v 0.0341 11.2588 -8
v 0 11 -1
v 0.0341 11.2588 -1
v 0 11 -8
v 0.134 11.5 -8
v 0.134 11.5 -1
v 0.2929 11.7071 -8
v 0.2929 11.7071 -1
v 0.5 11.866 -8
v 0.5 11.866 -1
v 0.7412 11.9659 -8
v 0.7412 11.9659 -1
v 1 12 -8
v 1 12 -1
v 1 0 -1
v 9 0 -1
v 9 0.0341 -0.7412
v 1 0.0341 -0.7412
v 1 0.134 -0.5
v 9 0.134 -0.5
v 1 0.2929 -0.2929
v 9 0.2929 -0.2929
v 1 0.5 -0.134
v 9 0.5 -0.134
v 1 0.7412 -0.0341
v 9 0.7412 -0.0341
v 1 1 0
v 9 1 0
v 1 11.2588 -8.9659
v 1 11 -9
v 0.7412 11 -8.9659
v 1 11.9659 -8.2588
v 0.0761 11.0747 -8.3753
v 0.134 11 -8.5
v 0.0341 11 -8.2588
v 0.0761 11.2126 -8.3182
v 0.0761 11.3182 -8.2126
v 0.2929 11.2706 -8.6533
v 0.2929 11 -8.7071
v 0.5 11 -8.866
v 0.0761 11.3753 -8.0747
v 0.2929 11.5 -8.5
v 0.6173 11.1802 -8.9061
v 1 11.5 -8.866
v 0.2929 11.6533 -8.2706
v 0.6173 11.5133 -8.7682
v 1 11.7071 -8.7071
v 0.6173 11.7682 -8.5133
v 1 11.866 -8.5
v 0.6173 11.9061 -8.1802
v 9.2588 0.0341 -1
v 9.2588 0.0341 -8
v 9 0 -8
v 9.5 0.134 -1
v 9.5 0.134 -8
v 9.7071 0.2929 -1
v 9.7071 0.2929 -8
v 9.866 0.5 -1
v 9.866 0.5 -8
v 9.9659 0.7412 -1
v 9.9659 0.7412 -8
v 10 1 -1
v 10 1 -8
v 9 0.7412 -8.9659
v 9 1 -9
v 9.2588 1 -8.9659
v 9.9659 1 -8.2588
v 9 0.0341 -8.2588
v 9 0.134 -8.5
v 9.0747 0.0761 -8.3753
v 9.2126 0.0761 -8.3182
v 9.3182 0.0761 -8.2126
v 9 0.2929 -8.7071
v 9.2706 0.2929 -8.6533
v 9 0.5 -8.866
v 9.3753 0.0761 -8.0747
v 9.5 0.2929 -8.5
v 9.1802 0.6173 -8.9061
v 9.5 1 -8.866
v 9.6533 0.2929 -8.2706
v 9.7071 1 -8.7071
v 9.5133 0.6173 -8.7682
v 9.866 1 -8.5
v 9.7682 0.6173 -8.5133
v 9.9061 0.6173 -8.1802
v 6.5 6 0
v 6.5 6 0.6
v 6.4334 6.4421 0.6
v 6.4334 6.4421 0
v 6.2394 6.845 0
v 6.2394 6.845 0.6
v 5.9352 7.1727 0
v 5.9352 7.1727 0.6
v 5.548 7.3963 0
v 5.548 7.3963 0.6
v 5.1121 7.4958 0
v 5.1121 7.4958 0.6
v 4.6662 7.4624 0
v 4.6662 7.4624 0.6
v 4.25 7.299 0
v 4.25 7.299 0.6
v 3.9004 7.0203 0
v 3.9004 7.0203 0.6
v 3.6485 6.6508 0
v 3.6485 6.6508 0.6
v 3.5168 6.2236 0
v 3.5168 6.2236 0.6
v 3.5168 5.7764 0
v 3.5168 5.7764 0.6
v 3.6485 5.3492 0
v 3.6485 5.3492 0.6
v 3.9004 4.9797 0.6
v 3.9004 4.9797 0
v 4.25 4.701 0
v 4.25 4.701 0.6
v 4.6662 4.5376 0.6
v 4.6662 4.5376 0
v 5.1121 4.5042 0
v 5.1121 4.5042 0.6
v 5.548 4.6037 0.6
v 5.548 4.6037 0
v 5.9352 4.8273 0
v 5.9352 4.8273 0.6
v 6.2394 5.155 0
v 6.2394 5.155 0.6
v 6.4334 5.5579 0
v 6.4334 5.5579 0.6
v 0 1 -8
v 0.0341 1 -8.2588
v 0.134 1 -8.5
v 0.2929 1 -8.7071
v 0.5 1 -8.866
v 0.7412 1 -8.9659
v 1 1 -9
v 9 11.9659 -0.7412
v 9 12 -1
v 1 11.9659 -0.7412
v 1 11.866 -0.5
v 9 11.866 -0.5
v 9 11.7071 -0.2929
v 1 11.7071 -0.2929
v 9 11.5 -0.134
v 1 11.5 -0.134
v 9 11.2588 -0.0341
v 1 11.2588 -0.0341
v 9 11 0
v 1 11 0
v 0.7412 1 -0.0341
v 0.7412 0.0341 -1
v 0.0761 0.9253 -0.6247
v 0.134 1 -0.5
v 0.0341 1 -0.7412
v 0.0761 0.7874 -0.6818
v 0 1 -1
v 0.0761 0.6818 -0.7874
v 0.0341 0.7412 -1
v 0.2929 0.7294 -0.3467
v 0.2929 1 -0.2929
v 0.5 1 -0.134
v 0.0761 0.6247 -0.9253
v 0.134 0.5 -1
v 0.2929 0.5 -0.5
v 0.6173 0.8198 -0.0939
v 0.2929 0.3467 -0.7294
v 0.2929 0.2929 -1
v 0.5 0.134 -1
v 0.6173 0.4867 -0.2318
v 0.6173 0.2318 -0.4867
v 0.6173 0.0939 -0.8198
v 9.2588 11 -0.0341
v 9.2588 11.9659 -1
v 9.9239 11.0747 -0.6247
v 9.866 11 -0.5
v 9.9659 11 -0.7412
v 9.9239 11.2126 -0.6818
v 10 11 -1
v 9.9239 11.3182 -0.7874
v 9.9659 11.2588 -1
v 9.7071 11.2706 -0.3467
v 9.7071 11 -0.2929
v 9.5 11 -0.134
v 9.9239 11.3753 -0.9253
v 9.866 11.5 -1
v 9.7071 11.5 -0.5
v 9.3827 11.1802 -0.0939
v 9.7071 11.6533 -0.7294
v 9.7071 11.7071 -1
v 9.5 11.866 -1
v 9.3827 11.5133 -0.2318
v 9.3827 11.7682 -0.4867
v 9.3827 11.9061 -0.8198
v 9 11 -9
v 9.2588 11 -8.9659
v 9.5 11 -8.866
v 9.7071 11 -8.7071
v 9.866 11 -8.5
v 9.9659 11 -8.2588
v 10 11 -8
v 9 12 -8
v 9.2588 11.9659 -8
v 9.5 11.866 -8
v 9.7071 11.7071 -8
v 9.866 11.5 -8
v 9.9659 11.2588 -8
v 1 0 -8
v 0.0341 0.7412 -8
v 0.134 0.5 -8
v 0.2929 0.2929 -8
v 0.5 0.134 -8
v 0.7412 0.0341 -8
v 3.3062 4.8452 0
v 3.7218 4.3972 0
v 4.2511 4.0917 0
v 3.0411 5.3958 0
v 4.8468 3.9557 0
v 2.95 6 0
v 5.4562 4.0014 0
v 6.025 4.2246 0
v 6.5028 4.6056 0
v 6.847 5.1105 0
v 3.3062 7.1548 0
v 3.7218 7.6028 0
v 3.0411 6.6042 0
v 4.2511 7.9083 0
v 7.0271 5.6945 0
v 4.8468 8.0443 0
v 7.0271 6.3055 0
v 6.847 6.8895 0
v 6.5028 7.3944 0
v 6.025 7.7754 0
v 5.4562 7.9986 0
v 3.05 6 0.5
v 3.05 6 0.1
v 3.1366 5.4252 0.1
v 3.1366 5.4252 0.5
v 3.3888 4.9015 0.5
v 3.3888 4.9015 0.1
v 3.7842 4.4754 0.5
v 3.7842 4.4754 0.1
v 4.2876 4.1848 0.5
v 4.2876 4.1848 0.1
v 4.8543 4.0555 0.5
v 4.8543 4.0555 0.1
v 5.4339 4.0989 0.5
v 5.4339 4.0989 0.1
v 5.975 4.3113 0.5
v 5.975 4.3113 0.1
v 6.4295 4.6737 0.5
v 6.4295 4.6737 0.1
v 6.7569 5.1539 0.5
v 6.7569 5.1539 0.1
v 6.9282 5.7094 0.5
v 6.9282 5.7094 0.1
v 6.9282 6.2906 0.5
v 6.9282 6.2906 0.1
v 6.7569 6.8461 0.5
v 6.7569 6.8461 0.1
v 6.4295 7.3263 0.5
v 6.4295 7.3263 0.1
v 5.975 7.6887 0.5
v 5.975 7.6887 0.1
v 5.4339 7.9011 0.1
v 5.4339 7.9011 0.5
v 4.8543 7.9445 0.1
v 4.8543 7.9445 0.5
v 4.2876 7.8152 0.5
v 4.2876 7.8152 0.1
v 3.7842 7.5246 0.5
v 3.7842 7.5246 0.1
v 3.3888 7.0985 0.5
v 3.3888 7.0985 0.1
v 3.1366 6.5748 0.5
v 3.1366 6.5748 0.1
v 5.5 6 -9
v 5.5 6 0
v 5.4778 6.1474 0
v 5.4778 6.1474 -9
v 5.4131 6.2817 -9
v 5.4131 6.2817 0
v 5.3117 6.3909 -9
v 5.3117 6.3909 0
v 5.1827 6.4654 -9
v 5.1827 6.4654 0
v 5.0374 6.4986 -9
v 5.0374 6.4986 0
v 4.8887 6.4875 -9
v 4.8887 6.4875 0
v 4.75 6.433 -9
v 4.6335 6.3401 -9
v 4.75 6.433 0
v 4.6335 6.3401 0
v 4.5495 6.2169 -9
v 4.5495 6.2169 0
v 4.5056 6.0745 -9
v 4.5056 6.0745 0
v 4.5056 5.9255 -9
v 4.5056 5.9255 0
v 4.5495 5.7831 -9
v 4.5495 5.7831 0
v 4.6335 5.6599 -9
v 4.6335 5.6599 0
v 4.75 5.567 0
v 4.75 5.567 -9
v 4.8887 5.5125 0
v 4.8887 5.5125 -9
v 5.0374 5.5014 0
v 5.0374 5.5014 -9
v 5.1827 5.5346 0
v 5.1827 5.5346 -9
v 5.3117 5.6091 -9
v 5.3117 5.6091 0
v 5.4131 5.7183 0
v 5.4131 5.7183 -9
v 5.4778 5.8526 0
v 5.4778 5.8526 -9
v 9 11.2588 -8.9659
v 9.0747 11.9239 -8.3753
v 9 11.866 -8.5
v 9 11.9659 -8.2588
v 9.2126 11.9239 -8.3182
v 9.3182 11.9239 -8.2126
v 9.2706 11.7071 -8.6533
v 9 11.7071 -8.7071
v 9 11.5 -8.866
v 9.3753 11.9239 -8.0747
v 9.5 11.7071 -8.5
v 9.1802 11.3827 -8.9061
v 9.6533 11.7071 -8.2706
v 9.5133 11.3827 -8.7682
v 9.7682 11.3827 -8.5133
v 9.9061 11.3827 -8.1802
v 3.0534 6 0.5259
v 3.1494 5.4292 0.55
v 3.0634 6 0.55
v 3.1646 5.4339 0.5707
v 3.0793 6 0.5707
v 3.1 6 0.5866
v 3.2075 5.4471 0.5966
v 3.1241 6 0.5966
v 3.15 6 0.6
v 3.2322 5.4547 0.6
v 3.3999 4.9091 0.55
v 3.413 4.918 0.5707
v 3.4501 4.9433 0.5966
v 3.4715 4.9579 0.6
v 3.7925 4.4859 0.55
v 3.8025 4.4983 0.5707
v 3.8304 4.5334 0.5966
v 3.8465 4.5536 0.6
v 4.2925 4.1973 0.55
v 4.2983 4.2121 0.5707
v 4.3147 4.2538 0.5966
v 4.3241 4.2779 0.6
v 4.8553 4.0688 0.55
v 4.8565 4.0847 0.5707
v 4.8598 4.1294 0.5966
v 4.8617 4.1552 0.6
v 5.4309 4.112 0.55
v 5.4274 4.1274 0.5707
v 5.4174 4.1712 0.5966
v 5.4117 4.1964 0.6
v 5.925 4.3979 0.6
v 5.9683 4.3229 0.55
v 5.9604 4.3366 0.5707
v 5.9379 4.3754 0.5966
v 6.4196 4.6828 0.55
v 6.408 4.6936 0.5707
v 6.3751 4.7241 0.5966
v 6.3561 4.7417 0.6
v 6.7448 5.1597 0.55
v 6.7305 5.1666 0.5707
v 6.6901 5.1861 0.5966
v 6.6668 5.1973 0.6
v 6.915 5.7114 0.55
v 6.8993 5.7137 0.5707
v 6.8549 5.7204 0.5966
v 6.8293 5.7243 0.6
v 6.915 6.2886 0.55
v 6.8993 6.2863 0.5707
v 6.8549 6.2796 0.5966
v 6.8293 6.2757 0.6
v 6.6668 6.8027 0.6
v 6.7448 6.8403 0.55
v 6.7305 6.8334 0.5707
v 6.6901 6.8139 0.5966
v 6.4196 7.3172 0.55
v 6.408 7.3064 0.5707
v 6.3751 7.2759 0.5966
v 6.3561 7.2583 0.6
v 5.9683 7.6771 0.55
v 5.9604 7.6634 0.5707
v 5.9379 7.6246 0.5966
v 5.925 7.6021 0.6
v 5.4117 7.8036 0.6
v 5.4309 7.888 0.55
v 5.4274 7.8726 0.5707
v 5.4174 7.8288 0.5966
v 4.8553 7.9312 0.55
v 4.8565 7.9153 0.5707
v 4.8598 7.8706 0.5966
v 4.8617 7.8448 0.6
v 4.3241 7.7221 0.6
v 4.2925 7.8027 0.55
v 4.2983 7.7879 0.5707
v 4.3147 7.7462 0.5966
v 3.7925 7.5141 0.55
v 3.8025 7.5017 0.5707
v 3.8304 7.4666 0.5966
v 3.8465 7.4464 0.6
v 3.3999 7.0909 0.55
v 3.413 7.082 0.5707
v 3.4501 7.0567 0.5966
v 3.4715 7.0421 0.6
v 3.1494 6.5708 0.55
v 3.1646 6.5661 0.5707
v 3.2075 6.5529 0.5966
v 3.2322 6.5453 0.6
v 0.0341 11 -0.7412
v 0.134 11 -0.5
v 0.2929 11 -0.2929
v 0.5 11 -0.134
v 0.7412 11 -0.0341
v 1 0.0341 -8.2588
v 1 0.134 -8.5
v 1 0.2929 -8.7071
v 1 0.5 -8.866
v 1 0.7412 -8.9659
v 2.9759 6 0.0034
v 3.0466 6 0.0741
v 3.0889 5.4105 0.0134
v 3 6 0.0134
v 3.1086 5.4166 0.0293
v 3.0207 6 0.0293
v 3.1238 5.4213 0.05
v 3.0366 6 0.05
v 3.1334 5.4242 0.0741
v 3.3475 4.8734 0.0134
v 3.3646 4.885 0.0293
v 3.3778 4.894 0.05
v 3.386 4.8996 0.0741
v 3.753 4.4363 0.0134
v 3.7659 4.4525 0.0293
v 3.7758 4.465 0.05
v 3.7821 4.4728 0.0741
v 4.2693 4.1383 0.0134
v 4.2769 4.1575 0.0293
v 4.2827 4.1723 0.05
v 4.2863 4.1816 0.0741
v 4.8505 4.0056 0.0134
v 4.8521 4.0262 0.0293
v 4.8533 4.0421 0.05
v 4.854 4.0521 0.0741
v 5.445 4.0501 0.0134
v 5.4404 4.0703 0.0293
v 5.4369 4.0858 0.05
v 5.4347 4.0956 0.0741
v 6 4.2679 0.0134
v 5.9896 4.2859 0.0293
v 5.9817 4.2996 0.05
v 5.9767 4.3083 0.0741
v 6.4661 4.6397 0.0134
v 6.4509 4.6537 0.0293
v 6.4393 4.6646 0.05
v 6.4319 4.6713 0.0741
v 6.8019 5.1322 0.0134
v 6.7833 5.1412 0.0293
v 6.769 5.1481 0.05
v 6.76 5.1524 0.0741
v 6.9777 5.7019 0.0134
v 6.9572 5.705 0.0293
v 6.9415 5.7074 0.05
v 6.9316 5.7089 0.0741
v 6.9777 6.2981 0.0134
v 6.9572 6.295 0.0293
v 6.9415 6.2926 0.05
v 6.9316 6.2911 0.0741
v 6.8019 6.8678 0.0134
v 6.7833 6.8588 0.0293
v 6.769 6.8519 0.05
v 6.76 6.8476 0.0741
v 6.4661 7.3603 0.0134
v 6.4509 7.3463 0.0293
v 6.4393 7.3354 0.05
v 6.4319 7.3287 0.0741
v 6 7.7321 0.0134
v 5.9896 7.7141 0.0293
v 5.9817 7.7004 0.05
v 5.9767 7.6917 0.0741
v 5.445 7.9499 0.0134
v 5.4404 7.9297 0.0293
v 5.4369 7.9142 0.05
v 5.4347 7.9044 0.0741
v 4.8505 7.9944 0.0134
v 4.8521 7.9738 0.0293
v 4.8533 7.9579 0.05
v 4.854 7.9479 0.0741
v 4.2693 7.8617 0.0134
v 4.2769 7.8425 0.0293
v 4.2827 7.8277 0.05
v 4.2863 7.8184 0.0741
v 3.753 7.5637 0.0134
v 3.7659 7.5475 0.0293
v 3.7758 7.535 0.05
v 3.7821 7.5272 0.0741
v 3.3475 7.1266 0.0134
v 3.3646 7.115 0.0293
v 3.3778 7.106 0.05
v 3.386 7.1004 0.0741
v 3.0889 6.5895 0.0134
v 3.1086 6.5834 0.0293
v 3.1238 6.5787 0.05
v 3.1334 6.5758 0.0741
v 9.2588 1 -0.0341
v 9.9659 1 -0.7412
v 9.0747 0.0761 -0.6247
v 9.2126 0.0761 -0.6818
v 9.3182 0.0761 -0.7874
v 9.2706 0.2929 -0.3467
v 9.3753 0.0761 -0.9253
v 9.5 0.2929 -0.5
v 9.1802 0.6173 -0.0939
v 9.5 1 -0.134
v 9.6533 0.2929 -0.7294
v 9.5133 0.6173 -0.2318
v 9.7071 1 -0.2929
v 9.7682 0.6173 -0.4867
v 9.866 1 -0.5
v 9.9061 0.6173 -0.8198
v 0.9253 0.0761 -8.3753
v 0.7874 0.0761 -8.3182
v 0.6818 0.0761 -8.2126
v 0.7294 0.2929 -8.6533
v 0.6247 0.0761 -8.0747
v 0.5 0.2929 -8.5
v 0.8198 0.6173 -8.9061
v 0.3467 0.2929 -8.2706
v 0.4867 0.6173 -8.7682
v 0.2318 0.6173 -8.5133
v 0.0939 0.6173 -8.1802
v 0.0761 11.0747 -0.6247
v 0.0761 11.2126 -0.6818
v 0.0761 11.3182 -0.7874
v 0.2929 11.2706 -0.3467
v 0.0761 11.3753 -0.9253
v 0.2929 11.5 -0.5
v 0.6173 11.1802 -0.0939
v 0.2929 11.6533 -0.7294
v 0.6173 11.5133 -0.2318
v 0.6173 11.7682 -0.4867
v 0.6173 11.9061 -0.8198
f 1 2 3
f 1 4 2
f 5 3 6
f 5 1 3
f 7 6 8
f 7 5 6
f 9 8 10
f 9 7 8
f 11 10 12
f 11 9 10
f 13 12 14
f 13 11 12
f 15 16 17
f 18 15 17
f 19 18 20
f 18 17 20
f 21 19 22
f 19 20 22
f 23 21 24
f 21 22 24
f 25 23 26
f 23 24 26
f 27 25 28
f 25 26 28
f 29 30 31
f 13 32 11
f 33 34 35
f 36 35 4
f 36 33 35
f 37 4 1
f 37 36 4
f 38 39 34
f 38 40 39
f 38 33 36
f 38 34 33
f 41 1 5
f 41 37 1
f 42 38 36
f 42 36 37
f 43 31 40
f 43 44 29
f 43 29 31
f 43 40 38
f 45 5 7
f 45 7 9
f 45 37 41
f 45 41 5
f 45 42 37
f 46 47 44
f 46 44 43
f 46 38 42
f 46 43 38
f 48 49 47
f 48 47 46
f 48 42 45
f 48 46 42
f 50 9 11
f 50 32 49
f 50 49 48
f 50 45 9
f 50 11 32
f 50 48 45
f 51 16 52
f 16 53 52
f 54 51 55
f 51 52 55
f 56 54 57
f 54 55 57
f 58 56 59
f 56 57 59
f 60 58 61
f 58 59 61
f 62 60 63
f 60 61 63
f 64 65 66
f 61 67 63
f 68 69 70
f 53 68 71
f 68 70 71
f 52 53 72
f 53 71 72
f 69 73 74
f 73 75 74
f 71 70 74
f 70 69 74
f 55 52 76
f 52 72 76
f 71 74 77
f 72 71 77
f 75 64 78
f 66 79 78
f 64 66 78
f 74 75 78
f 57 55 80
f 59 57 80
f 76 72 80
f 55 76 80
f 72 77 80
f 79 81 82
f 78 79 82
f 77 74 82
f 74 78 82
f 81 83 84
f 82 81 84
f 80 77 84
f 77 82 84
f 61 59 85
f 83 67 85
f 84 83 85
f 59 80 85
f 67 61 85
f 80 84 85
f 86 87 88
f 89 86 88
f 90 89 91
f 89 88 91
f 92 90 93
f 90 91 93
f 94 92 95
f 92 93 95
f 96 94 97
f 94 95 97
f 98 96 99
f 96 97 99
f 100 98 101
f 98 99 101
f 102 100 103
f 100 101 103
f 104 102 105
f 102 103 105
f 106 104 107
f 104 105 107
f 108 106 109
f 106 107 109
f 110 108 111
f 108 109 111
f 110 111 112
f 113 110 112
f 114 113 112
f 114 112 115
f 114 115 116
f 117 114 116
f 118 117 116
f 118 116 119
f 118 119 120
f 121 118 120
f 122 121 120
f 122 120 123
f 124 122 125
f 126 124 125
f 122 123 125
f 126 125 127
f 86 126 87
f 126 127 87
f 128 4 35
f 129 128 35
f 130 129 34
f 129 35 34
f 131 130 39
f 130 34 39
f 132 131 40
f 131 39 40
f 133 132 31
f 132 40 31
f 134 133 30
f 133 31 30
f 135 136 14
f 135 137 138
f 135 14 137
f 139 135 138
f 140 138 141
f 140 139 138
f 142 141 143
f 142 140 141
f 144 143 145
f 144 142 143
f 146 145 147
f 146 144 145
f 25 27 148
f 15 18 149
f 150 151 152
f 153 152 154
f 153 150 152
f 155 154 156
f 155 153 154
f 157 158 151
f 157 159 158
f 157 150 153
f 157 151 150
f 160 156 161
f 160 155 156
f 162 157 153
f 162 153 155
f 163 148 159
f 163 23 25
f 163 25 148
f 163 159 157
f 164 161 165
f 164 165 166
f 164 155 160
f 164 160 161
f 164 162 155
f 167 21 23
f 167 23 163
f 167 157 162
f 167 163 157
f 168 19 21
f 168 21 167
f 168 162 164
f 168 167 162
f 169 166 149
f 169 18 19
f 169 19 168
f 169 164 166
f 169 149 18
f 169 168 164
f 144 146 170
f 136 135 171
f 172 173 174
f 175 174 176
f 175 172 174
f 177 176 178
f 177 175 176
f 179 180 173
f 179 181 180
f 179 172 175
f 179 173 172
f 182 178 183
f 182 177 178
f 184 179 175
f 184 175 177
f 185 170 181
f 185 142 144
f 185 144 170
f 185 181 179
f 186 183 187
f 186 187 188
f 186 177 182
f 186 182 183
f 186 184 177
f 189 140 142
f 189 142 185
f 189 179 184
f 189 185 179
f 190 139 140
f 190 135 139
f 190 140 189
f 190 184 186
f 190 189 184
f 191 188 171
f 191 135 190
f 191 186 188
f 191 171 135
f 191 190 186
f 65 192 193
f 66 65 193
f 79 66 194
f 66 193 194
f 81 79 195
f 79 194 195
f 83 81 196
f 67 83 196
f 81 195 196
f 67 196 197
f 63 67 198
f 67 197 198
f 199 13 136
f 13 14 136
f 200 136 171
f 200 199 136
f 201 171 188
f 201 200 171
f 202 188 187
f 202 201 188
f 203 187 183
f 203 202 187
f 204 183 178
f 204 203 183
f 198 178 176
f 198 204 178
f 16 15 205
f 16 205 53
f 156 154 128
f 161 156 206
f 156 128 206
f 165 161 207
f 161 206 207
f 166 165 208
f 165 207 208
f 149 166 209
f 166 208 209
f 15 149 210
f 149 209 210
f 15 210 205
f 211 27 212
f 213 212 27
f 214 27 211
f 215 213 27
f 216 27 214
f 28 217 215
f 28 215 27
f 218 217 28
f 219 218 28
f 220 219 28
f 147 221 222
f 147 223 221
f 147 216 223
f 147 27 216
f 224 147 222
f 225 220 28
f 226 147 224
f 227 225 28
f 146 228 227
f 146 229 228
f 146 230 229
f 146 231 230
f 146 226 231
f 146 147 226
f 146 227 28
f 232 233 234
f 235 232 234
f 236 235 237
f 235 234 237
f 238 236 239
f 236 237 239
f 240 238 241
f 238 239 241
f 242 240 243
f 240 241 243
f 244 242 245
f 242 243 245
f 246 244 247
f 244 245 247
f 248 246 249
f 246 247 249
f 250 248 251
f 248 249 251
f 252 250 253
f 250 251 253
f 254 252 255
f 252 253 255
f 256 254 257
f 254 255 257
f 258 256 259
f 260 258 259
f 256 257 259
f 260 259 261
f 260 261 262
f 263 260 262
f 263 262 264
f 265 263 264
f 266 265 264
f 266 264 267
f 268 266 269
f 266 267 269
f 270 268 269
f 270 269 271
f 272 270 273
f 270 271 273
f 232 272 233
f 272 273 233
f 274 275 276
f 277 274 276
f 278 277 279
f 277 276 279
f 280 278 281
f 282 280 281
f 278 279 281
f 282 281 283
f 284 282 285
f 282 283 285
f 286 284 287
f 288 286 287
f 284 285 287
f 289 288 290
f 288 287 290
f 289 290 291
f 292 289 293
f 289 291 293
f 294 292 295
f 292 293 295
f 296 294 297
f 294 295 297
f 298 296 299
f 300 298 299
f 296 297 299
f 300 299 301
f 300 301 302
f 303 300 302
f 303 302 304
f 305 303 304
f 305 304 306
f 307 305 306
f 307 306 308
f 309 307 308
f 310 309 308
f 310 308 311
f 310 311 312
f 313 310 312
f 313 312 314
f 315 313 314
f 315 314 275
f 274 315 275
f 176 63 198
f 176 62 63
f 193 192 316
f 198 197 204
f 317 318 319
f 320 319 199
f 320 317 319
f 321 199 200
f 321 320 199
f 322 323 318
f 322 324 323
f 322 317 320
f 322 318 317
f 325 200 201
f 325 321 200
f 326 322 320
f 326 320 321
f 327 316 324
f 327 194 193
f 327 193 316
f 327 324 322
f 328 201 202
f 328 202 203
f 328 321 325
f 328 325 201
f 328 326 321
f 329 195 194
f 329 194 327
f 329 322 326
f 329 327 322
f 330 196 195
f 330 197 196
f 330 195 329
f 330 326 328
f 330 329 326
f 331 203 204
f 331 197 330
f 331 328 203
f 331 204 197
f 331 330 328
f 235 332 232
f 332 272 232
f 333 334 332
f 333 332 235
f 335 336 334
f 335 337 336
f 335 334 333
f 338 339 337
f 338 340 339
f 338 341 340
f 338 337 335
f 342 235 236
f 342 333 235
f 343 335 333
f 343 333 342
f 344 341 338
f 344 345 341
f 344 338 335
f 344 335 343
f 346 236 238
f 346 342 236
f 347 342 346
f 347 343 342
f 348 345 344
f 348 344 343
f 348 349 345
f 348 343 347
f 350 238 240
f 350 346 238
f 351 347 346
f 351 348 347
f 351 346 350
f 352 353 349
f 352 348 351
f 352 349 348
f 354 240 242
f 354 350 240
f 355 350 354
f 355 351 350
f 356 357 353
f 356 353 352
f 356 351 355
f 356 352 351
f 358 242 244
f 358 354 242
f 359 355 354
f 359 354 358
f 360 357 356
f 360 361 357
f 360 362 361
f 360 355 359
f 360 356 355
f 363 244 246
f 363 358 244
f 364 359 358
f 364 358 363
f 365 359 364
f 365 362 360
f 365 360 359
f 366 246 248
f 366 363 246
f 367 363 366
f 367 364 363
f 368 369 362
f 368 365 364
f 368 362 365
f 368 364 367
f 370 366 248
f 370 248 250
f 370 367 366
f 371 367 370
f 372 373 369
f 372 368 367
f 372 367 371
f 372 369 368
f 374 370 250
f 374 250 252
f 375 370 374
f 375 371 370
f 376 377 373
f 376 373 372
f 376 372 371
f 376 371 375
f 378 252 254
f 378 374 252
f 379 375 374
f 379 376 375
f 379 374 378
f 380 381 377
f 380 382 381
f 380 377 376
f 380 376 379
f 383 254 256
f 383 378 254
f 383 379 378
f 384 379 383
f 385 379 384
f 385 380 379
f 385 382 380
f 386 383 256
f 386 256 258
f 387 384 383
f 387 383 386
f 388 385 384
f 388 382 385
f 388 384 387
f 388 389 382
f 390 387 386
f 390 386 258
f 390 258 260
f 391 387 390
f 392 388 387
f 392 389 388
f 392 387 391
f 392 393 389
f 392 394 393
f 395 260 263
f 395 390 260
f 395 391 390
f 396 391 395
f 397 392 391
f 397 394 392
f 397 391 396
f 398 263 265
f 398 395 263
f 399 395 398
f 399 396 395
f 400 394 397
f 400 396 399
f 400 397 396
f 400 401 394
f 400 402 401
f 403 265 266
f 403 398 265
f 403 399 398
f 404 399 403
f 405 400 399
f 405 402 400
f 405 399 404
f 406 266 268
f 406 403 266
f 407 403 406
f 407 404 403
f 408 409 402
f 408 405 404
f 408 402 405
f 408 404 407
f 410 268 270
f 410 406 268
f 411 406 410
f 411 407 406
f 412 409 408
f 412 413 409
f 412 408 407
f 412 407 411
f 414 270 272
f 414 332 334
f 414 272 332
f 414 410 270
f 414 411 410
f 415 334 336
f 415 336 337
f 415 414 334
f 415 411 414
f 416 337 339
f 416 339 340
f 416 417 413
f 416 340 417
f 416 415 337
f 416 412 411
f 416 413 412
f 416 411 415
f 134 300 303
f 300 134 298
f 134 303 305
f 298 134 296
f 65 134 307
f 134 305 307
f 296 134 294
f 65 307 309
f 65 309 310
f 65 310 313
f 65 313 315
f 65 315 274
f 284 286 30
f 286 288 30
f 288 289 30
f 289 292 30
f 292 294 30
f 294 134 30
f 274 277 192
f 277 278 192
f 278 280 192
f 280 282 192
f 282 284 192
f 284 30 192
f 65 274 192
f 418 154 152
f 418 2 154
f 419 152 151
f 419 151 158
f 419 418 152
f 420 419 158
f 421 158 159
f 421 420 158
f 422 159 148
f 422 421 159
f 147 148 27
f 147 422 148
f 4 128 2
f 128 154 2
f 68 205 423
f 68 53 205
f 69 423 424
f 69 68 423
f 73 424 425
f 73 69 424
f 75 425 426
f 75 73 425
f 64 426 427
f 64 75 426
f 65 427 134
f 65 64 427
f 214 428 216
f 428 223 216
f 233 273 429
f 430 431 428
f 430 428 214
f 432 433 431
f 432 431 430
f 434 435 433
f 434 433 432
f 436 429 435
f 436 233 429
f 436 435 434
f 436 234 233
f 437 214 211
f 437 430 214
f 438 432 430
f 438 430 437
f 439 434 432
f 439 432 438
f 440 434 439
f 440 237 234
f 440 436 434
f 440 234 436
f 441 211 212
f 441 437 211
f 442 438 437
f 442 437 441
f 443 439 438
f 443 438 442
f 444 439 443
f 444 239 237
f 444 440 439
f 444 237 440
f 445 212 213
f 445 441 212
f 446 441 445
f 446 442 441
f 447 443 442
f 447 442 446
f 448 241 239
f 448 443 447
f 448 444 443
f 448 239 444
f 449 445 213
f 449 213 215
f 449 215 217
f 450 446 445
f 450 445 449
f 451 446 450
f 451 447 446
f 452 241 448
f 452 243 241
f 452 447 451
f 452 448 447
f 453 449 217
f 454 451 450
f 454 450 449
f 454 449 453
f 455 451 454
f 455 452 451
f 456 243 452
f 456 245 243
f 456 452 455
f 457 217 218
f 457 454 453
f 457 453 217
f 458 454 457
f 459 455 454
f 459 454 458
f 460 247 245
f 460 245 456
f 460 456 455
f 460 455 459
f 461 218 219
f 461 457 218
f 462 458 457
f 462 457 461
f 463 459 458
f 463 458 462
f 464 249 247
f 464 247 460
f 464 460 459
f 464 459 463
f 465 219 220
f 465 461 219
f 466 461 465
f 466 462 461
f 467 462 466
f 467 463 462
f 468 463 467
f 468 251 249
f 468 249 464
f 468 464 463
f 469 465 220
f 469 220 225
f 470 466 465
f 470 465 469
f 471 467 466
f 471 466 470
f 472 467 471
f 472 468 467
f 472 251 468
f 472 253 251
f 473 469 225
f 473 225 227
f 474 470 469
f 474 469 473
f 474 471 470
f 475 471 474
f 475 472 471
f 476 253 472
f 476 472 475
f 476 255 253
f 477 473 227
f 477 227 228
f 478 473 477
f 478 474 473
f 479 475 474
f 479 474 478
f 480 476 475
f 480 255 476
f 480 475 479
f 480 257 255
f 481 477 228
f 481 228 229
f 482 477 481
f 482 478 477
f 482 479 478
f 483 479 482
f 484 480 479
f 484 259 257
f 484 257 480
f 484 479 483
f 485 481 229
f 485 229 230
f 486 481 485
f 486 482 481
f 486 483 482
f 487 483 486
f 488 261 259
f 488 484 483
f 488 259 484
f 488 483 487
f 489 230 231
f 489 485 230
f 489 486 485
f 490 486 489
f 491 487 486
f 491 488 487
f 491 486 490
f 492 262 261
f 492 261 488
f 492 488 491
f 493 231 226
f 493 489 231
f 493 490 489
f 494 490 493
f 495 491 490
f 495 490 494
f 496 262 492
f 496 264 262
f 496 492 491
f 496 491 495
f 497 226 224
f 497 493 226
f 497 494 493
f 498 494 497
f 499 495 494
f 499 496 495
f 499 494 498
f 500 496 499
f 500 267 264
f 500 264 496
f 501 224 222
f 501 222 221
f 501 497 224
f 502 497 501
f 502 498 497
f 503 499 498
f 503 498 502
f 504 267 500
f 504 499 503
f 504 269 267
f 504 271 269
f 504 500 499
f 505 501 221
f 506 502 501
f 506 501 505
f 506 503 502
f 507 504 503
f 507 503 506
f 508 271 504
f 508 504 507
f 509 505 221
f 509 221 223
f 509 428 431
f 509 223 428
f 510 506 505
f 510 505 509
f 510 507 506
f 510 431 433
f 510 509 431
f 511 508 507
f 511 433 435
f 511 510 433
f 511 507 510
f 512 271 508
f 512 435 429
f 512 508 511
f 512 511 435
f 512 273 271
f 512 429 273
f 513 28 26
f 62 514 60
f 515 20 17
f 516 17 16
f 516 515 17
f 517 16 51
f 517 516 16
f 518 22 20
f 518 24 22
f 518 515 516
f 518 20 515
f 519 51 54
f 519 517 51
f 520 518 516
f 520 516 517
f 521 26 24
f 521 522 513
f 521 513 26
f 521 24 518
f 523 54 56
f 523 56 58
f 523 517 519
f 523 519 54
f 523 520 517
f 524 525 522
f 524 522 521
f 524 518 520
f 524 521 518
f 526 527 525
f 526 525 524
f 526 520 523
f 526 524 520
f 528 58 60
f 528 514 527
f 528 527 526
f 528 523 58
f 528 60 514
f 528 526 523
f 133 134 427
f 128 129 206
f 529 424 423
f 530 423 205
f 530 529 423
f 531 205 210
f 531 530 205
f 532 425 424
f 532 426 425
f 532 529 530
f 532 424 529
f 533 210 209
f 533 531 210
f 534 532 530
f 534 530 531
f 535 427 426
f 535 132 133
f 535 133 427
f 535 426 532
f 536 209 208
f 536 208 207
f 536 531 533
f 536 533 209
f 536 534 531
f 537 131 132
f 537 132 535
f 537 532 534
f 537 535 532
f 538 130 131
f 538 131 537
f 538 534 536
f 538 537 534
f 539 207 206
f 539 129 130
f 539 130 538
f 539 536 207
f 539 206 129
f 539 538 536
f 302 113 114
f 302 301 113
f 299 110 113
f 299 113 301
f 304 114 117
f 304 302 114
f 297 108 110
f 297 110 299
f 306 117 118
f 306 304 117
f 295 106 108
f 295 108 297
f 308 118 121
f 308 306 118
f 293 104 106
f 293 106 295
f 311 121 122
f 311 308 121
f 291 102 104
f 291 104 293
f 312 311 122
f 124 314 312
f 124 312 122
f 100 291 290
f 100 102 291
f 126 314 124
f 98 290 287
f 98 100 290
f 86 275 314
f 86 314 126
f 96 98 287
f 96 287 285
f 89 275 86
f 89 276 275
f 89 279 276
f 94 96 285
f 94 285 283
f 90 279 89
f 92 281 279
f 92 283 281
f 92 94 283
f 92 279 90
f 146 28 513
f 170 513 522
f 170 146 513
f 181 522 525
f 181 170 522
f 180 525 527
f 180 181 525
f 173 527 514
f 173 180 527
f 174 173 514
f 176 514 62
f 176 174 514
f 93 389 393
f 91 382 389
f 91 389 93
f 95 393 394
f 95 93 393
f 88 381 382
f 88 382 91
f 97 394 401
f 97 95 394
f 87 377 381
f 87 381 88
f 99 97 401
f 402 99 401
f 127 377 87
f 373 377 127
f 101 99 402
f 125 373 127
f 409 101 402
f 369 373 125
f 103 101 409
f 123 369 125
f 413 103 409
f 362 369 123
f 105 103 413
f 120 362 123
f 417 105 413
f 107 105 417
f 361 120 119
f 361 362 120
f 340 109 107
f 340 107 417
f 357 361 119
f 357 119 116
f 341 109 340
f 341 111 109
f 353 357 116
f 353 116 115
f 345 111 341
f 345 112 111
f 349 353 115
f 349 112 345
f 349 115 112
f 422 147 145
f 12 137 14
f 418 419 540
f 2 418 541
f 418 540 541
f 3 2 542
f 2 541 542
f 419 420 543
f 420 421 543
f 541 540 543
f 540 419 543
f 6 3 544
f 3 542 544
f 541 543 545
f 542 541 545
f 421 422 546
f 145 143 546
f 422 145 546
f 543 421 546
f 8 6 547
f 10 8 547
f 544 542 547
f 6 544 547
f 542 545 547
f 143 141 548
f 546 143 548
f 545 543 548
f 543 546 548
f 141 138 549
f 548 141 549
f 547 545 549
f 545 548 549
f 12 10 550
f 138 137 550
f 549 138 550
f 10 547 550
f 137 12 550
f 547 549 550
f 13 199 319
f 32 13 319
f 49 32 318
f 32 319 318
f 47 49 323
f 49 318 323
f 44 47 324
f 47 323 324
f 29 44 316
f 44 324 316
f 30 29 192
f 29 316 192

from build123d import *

# Parameters (mm, degrees)
SKETCH1_W           = 10
SKETCH1_H           = 12
BOSS_EXTRUDE1_DEPTH = 9
SKETCH3_R           = 1.95
BOSS_EXTRUDE2_DEPTH = 0.6
SKETCH5_R           = 1.5
CUT_EXTRUDE1_DEPTH  = 0.6
SKETCH7_R           = 0.5
CUT_EXTRUDE2_DEPTH  = 19.027756377
FILLET1_R           = 1
FILLET2_R           = 0.1


with BuildPart() as part:
    # Sketch1 → Boss-Extrude1 (new body)
    with BuildSketch(Plane.XY):
        with Locations((5, 6)):
            Rectangle(SKETCH1_W, SKETCH1_H)
    extrude(amount=-BOSS_EXTRUDE1_DEPTH)

    # Sketch3 → Boss-Extrude2 (add)
    with BuildSketch(Plane.XY):
        with Locations(Location((5, 6, 0), (0, 0, 180))):
            Circle(SKETCH3_R)
    extrude(amount=BOSS_EXTRUDE2_DEPTH)

    # Sketch5 → Cut-Extrude1 (cut)
    with BuildSketch(Plane.XY.offset(0.6)):
        with Locations((5, 6)):
            Circle(SKETCH5_R)
    extrude(amount=-CUT_EXTRUDE1_DEPTH, mode=Mode.SUBTRACT)

    # Sketch7 → Cut-Extrude2 (cut, through all)
    with BuildSketch(Plane.XY):
        with Locations((5, 6)):
            Circle(SKETCH7_R)
    extrude(amount=-CUT_EXTRUDE2_DEPTH, mode=Mode.SUBTRACT)

    # Fillet1
    fillet1_edges = [part.edges().sort_by_distance(p)[0] for p in [
        (10, 6, -9),
        (5, 12, -9),
        (0, 6, -9),
        (5, 12, 0),
        (10, 6, 0),
        (5, 0, 0),
        (0, 6, 0),
        (5, 0, -9),
        (0, 12, -4.5),
        (10, 12, -4.5),
        (10, 0, -4.5),
        (0, 0, -4.5),
    ]]
    fillet(fillet1_edges, radius=FILLET1_R)

    # Fillet2
    fillet2_edges = [part.edges().sort_by_distance(p)[0] for p in [
        (6.95, 6, 0),
        (6.95, 6, 0.6),
    ]]
    fillet(fillet2_edges, radius=FILLET2_R)


solid = part.part
